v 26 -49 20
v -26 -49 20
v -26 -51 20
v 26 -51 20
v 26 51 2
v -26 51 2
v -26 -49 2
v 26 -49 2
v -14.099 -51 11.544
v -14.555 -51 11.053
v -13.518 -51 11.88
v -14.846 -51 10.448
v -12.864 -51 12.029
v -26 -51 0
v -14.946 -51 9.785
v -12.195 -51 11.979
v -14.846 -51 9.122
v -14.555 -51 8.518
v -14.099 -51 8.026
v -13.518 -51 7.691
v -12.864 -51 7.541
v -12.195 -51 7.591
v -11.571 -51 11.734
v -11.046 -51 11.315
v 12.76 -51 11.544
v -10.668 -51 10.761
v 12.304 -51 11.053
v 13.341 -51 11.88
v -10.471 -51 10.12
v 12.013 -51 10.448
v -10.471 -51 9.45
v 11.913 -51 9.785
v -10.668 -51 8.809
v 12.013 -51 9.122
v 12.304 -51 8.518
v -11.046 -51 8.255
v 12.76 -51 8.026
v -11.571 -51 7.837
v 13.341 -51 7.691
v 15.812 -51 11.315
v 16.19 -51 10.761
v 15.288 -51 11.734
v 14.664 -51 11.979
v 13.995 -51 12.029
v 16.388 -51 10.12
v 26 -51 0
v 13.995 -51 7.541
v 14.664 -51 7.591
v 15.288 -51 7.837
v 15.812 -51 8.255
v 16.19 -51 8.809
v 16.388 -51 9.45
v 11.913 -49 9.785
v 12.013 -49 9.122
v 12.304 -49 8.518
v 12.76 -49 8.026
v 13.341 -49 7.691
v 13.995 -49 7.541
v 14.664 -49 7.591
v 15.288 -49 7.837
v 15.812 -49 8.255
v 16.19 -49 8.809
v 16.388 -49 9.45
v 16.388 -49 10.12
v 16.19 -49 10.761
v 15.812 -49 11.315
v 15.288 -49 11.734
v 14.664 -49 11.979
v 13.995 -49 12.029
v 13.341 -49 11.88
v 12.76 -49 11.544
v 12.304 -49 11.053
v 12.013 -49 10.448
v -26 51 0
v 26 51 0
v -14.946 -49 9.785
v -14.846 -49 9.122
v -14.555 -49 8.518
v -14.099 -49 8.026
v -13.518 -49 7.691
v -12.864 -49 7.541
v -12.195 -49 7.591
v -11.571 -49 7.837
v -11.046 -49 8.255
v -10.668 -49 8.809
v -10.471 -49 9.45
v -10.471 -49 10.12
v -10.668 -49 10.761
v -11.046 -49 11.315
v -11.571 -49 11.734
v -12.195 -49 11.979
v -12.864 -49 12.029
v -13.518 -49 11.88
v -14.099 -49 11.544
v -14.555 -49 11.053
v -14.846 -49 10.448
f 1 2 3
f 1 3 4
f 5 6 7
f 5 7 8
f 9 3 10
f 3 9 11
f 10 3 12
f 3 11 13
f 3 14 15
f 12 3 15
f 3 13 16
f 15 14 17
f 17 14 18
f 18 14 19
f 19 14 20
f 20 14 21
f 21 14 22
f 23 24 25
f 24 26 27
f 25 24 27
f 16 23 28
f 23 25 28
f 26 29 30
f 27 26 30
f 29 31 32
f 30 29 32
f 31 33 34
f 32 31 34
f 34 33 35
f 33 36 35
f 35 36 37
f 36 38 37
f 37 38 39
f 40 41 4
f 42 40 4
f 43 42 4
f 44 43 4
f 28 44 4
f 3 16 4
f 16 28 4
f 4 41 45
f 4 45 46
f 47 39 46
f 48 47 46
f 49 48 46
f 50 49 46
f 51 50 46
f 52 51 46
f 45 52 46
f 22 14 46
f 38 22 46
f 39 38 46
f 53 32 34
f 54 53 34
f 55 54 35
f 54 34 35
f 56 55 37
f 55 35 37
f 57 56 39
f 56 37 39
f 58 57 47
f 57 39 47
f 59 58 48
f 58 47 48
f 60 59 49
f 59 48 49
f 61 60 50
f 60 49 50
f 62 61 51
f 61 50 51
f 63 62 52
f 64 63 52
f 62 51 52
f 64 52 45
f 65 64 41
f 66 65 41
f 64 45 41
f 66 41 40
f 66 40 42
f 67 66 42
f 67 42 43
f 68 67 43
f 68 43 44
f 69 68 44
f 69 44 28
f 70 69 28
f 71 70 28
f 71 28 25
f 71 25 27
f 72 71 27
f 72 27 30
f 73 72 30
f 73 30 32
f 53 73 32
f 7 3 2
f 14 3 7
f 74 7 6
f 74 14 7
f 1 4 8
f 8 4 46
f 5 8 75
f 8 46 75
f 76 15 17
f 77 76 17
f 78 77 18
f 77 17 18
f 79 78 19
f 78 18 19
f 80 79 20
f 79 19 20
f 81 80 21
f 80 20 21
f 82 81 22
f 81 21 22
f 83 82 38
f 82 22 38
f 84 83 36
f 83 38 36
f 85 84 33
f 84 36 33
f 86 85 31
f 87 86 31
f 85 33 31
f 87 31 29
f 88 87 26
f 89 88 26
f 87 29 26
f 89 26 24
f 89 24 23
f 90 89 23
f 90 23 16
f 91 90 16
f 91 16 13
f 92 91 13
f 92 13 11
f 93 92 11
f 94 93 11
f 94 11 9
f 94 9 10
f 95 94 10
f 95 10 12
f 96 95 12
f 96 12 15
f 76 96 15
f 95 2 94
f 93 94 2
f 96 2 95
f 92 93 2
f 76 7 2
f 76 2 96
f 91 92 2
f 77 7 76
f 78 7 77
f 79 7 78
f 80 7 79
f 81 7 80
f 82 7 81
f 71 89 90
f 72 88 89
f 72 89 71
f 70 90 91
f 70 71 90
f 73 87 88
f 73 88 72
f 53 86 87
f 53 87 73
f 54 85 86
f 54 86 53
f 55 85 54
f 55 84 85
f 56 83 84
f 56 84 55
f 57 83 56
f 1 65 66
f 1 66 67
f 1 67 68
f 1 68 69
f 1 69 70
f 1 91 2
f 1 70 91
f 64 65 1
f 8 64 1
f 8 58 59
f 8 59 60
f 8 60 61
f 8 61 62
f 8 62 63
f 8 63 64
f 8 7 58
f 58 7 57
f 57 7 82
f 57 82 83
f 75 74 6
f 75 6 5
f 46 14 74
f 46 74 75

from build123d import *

# Parameters (mm, degrees)
ESQUISSE1_W             = 52
ESQUISSE1_H             = 102
BOSS_EXTRU_1_DEPTH      = 20
ESQUISSE2_W             = 66.008627658
ESQUISSE2_H             = 40.946179855
ENL_V_MAT_EXTRU_1_DEPTH = 100
D_GAGEMENT_M42_D        = 4.5


with BuildPart() as part:
    # Esquisse1 → Boss.-Extru.1 (new body)
    with BuildSketch(Plane.XY):
        Rectangle(ESQUISSE1_W, ESQUISSE1_H)
    extrude(amount=BOSS_EXTRU_1_DEPTH)

    # Esquisse2 → Enlèv. mat.-Extru.1 (cut)
    with BuildSketch(Plane(origin=(0, 51, 0), x_dir=(1, 0, 0), z_dir=(0, 1, 0))):
        with Locations((1.405901571, -22.473089928)):
            Rectangle(ESQUISSE2_W, ESQUISSE2_H)
    extrude(amount=-ENL_V_MAT_EXTRU_1_DEPTH, mode=Mode.SUBTRACT)

    # Dégagement M42 (through all)
    with Locations(Plane(origin=(0, -49, 0), x_dir=(1, 0, 0), z_dir=(0, 1, 0))):
        with Locations((-12.695679618, -9.785063319), (14.163037838, -9.785063319)):
            Hole(D_GAGEMENT_M42_D / 2)


solid = part.part
